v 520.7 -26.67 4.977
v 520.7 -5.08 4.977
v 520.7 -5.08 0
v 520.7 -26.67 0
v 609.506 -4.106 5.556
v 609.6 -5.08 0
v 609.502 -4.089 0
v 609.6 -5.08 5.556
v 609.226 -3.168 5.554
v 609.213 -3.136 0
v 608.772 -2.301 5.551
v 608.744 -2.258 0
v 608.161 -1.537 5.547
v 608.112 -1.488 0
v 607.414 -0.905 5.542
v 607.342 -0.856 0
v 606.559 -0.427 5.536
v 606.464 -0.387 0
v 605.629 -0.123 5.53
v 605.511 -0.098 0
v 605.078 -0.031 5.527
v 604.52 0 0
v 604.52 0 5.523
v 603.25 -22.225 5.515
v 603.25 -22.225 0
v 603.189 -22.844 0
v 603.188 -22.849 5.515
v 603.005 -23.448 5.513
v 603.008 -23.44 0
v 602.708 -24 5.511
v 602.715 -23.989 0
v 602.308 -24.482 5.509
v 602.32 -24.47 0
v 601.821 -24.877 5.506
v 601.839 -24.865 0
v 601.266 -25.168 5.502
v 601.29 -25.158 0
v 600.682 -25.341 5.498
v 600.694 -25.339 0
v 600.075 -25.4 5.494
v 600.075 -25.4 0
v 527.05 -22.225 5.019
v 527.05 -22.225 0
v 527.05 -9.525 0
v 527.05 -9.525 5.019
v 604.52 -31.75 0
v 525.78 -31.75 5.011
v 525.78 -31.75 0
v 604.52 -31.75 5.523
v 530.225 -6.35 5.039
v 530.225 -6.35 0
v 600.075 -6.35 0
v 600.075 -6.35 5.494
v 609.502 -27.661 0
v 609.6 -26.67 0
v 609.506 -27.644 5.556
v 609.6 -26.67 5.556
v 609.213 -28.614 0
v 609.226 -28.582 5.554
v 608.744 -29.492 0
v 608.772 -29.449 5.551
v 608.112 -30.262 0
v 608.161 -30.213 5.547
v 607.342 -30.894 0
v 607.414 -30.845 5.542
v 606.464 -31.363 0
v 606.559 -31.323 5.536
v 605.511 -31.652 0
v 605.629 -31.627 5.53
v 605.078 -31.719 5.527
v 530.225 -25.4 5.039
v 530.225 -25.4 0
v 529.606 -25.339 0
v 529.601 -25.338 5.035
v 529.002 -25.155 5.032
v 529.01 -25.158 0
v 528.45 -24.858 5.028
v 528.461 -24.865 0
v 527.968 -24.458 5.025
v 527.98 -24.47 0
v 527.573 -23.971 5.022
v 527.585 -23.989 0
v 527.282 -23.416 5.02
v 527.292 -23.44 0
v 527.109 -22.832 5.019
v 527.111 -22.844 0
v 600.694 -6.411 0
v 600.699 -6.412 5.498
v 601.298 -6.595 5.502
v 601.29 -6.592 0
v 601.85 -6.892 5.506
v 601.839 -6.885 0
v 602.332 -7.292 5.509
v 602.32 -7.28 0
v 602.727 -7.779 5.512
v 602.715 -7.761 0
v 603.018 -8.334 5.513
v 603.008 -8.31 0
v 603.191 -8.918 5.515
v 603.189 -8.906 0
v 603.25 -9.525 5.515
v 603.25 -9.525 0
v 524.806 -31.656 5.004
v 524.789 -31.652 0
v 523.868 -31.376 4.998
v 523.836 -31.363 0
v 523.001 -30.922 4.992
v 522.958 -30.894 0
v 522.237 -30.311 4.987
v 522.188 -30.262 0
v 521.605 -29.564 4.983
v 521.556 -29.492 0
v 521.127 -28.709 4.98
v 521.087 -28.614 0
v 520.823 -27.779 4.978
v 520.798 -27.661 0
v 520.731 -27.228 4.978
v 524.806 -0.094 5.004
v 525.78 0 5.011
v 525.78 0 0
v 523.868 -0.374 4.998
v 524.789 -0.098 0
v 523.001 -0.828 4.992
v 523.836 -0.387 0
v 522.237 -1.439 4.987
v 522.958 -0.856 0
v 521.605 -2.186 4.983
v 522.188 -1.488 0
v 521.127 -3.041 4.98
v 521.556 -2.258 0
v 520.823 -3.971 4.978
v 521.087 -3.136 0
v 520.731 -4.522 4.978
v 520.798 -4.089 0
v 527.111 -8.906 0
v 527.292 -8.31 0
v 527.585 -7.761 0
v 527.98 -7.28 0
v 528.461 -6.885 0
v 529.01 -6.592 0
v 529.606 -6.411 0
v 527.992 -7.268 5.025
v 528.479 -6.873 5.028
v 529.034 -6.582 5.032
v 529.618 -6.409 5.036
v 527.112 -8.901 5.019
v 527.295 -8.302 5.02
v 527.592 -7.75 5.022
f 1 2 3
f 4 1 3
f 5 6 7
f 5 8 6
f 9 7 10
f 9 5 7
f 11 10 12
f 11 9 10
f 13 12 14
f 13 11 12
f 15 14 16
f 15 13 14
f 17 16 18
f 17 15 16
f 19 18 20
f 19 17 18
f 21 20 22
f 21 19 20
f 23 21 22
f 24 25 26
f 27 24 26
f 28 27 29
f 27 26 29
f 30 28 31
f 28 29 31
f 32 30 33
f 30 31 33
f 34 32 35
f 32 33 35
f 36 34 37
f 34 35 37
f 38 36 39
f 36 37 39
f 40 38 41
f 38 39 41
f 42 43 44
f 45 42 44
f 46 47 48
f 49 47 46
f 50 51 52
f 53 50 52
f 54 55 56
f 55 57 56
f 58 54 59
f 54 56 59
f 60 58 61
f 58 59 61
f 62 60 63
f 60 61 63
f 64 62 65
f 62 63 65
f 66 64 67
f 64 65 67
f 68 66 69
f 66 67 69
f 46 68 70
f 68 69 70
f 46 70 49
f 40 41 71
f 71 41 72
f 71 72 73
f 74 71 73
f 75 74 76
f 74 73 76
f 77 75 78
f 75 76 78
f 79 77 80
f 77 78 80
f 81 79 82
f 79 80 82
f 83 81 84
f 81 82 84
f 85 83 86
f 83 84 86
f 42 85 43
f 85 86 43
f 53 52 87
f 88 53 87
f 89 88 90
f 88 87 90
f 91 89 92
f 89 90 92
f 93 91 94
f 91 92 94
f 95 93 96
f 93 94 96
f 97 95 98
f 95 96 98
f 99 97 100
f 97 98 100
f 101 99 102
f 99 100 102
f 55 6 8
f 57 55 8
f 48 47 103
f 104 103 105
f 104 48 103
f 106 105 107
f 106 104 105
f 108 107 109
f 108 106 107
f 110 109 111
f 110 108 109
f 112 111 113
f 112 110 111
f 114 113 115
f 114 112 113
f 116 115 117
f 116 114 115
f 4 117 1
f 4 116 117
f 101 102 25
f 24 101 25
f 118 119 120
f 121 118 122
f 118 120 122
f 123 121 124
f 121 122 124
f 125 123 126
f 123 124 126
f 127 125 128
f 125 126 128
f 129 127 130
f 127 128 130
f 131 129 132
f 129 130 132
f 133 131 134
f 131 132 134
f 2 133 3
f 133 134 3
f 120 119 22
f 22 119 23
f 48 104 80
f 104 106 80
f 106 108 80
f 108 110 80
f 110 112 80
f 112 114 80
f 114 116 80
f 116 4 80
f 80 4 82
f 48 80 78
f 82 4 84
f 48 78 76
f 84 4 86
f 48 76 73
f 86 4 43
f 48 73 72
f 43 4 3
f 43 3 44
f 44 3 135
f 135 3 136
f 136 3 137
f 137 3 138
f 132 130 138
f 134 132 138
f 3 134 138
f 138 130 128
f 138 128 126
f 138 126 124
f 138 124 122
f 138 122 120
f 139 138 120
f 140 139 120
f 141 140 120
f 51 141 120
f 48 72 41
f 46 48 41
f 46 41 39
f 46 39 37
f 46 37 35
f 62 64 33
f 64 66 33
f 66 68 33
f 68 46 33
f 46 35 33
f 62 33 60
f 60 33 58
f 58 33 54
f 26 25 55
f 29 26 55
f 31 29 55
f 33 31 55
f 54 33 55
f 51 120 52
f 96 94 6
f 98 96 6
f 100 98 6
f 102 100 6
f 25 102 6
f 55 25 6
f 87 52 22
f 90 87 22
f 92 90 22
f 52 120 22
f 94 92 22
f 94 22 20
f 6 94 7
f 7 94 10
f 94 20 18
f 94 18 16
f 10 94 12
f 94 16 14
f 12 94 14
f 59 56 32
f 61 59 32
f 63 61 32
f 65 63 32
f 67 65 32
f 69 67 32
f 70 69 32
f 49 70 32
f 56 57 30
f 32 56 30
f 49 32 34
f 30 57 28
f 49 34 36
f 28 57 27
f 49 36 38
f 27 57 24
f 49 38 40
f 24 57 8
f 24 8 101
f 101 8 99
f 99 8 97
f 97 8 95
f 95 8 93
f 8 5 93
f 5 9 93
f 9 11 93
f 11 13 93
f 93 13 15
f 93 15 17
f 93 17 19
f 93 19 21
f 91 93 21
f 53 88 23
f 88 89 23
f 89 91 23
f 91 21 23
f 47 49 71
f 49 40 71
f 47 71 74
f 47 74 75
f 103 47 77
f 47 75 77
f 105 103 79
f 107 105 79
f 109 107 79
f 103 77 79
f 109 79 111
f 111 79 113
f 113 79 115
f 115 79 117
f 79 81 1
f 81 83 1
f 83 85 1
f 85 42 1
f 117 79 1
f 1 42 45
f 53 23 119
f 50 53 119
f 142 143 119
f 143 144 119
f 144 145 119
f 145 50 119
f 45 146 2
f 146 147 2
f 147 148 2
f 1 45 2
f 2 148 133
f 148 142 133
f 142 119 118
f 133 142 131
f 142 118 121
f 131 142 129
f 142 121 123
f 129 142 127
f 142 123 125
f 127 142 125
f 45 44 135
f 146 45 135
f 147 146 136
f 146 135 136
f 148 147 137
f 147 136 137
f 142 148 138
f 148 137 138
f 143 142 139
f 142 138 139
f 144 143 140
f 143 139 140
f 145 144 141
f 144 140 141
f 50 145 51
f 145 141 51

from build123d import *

# Parameters (mm, degrees)
F3_DEPTH = 31.75
F5_DEPTH = 5.55725
F6_R     = 5.08


with BuildPart() as f3:
    # F1 (on Front) → F3 (new body)
    with BuildSketch(Plane.XZ):
        Polygon((609.6, 0), (609.6, 5.55625), (520.7, 4.977474), (520.7, 0), align=None)
    extrude(amount=F3_DEPTH)

    # F4 (on face) → F5 (cut, through all)
    with BuildSketch(Plane(origin=(0, 0, 0), x_dir=(1, 0, 0), z_dir=(0, 0, -1))):
        with BuildLine():
            Line((600.075, 25.4), (530.225, 25.4))
            ThreePointArc((530.225, 25.4), (527.979936, 24.470064), (527.05, 22.225))
            Line((527.05, 22.225), (527.05, 9.525))
            ThreePointArc((527.05, 9.525), (527.979936, 7.279936), (530.225, 6.35))
            Line((530.225, 6.35), (600.075, 6.35))
            ThreePointArc((600.075, 6.35), (602.320064, 7.279936), (603.25, 9.525))
            Line((603.25, 9.525), (603.25, 22.225))
            ThreePointArc((603.25, 22.225), (602.320064, 24.470064), (600.075, 25.4))
        make_face()
    extrude(amount=-F5_DEPTH, mode=Mode.SUBTRACT)

    # F6
    f6_edges = [f3.edges().sort_by_distance(p)[0] for p in [
        (520.7, -31.75, 2.488737),
        (520.7, 0, 2.488737),
        (609.6, -31.75, 2.778125),
        (609.6, 0, 2.778125),
    ]]
    fillet(f6_edges, radius=F6_R)


solid = f3.part
